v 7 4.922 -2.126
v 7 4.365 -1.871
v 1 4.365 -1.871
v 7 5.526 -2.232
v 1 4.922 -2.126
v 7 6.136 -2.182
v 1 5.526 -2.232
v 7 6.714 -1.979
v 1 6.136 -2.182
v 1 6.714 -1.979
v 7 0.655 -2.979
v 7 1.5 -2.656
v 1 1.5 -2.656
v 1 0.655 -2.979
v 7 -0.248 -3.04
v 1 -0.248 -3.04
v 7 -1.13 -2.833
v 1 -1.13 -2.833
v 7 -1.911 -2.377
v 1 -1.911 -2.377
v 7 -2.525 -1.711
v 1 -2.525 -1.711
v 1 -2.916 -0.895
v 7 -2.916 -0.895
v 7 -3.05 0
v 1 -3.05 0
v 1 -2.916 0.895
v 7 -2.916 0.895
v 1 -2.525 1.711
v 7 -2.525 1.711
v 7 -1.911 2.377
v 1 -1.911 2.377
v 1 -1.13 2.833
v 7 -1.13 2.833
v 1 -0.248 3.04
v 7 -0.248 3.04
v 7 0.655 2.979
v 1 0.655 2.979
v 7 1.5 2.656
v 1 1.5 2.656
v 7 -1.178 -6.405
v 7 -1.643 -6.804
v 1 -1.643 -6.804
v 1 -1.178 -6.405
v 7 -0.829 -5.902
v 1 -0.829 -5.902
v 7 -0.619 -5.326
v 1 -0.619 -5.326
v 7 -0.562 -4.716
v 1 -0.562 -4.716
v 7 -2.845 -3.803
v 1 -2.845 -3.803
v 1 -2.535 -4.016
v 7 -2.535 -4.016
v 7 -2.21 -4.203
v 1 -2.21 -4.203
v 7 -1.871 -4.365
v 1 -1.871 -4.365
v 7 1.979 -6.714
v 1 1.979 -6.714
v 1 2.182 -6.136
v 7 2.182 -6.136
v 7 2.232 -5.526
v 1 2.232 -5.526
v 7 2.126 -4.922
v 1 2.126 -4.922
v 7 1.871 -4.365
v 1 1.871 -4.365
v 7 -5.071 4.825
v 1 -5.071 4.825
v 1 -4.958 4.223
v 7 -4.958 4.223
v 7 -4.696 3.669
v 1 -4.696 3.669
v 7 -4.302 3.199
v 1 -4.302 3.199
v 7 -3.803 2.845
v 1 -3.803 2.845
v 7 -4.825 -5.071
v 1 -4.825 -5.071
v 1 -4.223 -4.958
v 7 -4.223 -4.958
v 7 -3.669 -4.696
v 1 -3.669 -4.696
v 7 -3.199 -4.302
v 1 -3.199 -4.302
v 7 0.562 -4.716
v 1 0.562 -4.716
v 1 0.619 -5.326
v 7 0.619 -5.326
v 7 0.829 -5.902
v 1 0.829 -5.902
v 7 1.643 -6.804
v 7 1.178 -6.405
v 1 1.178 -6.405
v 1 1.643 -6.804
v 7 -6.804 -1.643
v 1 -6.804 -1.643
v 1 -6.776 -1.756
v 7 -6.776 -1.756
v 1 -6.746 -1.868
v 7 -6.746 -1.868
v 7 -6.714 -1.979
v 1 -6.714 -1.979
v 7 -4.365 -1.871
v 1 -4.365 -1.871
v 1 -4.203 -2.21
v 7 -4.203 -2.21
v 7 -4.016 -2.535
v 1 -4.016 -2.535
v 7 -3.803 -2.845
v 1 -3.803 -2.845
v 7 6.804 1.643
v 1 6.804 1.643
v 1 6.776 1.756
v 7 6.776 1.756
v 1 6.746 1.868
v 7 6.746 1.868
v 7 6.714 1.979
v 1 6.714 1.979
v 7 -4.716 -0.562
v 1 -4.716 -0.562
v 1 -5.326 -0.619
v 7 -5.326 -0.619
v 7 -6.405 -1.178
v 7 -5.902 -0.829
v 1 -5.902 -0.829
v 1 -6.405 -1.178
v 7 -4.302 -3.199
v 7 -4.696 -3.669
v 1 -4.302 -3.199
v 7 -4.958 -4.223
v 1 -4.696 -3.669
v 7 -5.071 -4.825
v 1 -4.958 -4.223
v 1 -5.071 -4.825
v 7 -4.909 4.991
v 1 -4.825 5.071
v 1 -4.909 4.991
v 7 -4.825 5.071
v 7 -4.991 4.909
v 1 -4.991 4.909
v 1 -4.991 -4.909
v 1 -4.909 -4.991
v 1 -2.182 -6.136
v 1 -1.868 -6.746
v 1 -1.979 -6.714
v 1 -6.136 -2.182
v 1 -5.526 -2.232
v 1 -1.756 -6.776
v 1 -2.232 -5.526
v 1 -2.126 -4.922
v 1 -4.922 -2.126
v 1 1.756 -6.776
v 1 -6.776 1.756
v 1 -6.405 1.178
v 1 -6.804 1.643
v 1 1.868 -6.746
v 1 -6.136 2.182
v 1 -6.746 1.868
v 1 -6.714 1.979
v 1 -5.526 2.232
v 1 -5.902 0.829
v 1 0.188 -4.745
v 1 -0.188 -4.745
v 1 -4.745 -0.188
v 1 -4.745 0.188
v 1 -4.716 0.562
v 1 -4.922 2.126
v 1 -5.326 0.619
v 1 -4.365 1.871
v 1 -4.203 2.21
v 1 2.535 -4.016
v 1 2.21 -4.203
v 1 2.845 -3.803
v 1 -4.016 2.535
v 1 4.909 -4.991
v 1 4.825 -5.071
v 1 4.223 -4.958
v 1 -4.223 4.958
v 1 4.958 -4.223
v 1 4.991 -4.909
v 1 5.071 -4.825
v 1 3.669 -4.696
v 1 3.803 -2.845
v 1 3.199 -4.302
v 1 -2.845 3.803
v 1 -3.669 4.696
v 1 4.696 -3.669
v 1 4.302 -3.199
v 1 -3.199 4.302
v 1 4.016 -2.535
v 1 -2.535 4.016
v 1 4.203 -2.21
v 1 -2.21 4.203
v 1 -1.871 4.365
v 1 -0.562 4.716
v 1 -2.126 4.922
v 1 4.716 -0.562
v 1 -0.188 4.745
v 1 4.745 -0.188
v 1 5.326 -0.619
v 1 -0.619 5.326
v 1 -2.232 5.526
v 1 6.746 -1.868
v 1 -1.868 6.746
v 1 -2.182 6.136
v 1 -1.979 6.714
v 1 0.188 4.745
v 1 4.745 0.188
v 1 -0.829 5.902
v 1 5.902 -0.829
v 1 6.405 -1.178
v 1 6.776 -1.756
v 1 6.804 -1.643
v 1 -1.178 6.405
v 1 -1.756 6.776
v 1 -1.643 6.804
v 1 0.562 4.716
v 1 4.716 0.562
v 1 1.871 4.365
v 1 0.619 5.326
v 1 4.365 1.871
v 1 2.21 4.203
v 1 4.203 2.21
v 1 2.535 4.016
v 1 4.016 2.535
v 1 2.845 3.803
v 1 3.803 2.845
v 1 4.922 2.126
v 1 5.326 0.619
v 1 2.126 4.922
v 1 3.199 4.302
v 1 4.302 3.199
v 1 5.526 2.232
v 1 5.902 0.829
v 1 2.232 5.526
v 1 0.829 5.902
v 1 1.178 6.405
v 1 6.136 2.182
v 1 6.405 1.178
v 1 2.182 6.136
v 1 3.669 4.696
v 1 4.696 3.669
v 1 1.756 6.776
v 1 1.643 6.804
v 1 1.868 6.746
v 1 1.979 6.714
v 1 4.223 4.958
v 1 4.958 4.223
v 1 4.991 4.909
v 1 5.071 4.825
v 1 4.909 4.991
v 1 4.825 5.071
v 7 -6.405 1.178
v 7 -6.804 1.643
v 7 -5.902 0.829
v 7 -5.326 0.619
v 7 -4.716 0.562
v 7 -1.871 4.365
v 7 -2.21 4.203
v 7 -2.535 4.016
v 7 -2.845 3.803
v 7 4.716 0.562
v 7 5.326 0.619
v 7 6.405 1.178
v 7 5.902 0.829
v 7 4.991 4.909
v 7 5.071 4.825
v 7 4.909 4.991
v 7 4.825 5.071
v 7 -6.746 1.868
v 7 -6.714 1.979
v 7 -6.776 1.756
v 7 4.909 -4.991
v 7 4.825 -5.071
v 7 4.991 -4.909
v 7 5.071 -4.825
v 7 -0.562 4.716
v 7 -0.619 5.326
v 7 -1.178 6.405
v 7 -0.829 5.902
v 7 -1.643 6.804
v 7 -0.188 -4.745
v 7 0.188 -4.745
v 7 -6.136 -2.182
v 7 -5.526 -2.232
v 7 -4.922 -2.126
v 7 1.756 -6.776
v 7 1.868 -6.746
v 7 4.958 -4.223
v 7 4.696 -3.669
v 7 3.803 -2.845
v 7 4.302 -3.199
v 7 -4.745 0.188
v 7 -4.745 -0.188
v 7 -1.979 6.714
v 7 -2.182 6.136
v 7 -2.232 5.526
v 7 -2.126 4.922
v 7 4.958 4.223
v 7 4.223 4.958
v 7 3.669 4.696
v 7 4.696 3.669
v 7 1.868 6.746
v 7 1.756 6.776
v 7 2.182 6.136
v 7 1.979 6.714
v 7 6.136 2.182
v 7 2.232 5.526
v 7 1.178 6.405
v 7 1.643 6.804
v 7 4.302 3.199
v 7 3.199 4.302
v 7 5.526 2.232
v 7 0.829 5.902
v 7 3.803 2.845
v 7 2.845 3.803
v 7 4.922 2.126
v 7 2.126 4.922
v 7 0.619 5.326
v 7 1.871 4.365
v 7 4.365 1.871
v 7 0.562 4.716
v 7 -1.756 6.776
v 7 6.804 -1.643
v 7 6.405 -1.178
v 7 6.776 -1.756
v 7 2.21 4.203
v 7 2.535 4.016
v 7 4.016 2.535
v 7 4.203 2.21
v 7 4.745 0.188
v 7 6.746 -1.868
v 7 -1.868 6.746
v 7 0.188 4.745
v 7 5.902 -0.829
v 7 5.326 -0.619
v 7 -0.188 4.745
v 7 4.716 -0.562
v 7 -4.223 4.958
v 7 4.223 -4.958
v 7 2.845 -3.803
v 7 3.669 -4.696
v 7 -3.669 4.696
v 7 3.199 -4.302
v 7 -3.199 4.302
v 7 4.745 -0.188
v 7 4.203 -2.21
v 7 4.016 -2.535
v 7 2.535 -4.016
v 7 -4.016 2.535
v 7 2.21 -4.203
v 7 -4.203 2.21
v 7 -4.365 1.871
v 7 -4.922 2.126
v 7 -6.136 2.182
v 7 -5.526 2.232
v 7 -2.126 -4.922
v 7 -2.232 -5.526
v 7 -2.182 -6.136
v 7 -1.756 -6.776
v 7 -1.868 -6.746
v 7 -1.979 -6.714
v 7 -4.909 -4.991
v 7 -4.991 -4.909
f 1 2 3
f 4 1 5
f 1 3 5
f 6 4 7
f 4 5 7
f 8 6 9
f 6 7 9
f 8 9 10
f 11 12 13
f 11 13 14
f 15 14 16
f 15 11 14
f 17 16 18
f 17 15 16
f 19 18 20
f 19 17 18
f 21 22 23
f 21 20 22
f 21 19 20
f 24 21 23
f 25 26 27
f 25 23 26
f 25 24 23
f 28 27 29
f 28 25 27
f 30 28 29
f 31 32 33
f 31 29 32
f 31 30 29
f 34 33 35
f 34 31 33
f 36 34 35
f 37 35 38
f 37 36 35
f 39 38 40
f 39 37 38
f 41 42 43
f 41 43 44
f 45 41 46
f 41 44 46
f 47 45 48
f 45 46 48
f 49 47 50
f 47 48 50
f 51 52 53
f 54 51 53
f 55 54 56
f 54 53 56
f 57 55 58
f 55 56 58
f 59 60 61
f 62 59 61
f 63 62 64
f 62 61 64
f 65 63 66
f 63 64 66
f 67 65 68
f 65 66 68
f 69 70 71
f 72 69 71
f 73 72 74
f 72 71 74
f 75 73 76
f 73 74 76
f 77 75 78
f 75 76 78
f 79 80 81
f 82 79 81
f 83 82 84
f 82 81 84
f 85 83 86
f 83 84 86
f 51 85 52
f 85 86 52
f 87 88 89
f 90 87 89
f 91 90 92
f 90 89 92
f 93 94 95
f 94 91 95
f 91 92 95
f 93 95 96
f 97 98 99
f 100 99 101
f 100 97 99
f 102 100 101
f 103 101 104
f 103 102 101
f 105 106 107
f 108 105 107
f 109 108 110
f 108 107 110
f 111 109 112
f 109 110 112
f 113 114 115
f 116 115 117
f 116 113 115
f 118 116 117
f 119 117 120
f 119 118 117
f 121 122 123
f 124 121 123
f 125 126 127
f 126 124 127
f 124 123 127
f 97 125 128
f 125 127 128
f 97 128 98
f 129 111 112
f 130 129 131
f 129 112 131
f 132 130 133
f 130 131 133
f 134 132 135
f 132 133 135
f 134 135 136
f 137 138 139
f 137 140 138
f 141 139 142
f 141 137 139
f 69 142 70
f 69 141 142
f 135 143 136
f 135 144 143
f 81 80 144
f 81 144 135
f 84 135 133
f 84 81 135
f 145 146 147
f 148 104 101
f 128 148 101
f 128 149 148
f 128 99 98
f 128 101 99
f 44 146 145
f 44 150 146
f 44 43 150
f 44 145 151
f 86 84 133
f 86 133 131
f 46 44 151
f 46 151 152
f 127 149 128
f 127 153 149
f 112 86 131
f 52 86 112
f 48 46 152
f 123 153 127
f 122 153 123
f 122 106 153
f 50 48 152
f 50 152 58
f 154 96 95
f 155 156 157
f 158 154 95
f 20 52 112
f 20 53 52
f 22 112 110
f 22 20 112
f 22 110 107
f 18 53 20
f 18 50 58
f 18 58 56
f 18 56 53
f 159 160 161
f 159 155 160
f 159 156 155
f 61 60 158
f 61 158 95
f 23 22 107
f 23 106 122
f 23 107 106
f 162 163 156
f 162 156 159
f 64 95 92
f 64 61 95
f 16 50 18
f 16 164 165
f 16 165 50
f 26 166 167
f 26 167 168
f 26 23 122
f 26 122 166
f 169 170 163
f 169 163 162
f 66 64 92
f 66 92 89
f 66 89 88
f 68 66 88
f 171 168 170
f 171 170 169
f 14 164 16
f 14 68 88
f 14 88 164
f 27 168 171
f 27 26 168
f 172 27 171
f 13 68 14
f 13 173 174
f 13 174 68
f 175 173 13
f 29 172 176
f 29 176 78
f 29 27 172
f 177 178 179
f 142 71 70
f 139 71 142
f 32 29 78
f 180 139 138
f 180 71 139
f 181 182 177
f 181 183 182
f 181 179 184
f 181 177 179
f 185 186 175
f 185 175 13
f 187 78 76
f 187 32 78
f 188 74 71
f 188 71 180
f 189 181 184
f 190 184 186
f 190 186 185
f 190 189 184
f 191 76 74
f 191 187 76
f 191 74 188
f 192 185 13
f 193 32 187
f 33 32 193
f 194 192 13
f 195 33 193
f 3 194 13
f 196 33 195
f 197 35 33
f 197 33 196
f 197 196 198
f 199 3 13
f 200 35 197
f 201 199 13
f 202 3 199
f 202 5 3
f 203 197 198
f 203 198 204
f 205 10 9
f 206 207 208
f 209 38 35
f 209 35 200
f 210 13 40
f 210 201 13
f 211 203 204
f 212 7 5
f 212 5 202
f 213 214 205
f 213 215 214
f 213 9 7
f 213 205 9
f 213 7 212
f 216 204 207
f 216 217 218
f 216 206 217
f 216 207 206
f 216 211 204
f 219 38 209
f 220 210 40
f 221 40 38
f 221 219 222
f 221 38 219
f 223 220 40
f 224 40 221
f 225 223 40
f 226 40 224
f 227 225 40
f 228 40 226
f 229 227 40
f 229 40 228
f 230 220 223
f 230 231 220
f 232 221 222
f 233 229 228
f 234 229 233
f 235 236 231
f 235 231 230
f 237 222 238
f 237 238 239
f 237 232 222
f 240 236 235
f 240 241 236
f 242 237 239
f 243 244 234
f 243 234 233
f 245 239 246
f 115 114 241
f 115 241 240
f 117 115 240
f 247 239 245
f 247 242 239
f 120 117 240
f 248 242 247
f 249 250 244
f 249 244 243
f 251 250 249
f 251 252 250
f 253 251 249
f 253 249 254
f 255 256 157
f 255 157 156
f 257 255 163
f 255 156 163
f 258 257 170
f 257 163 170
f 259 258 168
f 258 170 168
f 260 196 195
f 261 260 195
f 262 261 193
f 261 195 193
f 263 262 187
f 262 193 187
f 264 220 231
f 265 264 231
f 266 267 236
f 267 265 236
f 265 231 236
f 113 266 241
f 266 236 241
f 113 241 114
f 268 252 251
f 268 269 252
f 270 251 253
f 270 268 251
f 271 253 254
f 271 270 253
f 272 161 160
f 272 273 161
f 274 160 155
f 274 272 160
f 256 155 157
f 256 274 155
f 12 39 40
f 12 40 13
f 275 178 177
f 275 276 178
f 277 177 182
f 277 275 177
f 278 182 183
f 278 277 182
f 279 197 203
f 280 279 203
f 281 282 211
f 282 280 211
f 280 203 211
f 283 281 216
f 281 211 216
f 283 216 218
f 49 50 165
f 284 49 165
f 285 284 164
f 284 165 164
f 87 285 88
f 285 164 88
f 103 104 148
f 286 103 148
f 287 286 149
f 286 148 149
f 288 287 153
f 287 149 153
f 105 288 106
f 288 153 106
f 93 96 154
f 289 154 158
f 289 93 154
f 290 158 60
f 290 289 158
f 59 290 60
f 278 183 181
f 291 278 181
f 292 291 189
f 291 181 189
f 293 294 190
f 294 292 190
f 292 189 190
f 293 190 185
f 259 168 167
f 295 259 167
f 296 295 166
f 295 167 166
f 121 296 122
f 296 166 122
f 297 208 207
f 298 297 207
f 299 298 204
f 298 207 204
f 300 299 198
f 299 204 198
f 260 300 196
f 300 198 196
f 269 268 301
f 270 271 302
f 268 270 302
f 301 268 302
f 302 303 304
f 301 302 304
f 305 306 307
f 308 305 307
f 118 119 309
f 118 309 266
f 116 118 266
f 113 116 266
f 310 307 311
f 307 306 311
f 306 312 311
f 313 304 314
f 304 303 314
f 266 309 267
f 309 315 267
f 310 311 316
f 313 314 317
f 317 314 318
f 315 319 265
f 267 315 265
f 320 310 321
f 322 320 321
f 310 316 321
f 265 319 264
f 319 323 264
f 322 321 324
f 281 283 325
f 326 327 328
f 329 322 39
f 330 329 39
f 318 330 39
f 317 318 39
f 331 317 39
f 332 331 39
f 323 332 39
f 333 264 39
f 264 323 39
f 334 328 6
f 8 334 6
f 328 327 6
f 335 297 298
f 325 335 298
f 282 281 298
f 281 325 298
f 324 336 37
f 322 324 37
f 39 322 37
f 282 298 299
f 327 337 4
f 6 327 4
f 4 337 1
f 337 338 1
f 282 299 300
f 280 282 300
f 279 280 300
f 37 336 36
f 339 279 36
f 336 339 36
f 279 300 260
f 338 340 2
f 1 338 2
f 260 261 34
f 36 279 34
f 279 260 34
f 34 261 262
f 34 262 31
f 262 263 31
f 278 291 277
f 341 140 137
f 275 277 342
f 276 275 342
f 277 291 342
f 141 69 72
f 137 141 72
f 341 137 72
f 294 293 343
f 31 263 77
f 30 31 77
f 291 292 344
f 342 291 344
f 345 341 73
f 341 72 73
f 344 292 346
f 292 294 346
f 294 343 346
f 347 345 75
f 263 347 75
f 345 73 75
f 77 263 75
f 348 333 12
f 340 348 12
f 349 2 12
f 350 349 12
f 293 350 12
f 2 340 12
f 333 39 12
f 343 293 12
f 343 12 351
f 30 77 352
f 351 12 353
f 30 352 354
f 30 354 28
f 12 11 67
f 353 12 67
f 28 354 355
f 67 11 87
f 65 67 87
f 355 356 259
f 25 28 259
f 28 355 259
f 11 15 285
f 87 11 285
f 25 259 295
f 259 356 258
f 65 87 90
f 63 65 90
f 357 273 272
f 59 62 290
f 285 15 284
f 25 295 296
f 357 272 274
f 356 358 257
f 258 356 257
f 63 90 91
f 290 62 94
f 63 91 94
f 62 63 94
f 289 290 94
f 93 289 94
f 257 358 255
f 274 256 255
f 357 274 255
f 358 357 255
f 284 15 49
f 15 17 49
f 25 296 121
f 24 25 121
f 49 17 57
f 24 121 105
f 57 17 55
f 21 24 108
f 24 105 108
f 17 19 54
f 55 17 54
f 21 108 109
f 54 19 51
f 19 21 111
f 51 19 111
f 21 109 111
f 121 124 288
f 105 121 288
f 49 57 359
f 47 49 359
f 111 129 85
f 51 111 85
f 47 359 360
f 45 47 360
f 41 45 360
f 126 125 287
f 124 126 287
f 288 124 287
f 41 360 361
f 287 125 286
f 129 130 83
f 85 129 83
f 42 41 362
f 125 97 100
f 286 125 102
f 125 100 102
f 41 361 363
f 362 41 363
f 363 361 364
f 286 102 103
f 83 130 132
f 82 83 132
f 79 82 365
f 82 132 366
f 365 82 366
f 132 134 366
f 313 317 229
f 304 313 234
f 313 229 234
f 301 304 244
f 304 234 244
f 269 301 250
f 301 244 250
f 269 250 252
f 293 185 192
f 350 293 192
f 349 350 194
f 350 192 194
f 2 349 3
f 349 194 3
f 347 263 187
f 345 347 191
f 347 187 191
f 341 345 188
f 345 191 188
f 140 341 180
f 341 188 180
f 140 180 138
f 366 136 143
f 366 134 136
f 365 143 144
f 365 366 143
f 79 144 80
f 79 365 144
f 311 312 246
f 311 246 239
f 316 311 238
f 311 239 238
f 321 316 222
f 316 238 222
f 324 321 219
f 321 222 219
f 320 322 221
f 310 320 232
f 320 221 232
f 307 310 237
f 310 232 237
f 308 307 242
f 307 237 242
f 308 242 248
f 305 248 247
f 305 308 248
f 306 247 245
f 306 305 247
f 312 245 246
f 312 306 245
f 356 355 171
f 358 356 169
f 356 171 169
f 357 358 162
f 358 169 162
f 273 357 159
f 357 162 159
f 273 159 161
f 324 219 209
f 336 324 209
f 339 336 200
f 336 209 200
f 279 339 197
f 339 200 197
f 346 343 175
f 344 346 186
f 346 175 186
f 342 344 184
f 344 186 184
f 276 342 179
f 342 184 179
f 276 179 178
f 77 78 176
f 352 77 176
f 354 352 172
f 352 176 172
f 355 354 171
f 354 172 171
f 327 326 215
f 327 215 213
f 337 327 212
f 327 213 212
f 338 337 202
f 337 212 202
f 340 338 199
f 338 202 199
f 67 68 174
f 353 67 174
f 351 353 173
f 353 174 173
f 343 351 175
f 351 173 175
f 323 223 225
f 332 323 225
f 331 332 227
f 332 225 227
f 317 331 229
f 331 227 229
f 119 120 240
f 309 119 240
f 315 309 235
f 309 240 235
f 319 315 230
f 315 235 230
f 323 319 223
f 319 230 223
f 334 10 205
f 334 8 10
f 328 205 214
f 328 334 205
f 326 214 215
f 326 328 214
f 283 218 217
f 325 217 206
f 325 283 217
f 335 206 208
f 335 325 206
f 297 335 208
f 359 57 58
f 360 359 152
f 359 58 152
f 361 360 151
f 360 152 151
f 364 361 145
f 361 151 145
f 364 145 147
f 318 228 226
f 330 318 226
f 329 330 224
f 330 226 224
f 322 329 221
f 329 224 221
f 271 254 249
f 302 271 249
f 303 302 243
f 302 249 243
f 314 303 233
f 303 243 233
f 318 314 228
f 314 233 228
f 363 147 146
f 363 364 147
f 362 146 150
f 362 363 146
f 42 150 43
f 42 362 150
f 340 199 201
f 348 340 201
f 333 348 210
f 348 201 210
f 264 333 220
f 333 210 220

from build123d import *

# Parameters (mm, degrees)
BASPROSKE_W        = 7
BASPROSKE_H        = 7
TOOTHCUT_DEPTH     = 13.124355653
TEETHCUTS_COUNT    = 12
TEETHCUTS_ANGLE    = 330
BORSKE_R           = 0.4
BORE_DEPTH         = 50.0000508
CUT_EXTRUDE1_DEPTH = 12.89949757
SKETCH2_R          = 8.839336396
CUT_EXTRUDE2_DEPTH = 1


with BuildPart() as part:
    # BasProSke → Base-Revolve (revolve)
    with BuildSketch(Plane(origin=(0, 0, 0), x_dir=(1, 0, 0), z_dir=(0, 1, 0)), mode=Mode.PRIVATE) as base_revolve_sk:
        with Locations((3.5, 3.5)):
            Rectangle(BASPROSKE_W, BASPROSKE_H)
    revolve(base_revolve_sk.sketch.rotate(Axis((-10, 0, 0), (1, 0, 0)), 180), axis=Axis((-10, 0, 0), (1, 0, 0)))

    # TooCutSke → ToothCut (cut, through all)
    with BuildSketch(Plane(origin=(0, 0, 0), x_dir=(0, 0, -1), z_dir=(1, 0, 0))):
        with BuildLine():
            ThreePointArc((0.562207301, 4.715604304), (0, 4.749), (-0.562207301, 4.715604304))
            ThreePointArc((-0.562207301, 4.715604304), (-0.837528627, 5.917009812), (-1.672850686, 6.823328788))
            ThreePointArc((-1.672850686, 6.823328788), (0, 7.0254), (1.672850686, 6.823328788))
            ThreePointArc((1.672850686, 6.823328788), (0.837528627, 5.917009812), (0.562207301, 4.715604304))
        make_face()
    toothcut = extrude(amount=TOOTHCUT_DEPTH, mode=Mode.SUBTRACT)

    # TeethCuts: ToothCut ×12 about axis
    teethcuts_axis = Axis((-10, 0, 0), (1, 0, 0))
    for i in range(1, TEETHCUTS_COUNT):
        add(toothcut.rotate(teethcuts_axis, i * TEETHCUTS_ANGLE / (TEETHCUTS_COUNT - 1)), mode=Mode.SUBTRACT)

    # BorSke → Bore (cut, symmetric)
    with BuildSketch(Plane(origin=(0, 0, 0), x_dir=(0, 0, -1), z_dir=(1, 0, 0))):
        with Locations(Location((0, 0, 0), (0, 0, 180))):
            Circle(BORSKE_R)
    extrude(amount=BORE_DEPTH, both=True, mode=Mode.SUBTRACT)

    # Sketch1 → Cut-Extrude1 (cut, through all)
    with BuildSketch(Plane(origin=(7, 0, 0), x_dir=(0, 0, -1), z_dir=(1, 0, 0))):
        with BuildLine():
            Line((-2.655654345, 1.5), (2.655654345, 1.5))
            ThreePointArc((2.655654345, 1.5), (0, -3.05), (-2.655654345, 1.5))
        make_face()
    extrude(amount=-CUT_EXTRUDE1_DEPTH, mode=Mode.SUBTRACT)

    # Sketch2 → Cut-Extrude2 (cut)
    with BuildSketch(Plane.ZY):
        Circle(SKETCH2_R)
    extrude(amount=-CUT_EXTRUDE2_DEPTH, mode=Mode.SUBTRACT)


solid = part.part
